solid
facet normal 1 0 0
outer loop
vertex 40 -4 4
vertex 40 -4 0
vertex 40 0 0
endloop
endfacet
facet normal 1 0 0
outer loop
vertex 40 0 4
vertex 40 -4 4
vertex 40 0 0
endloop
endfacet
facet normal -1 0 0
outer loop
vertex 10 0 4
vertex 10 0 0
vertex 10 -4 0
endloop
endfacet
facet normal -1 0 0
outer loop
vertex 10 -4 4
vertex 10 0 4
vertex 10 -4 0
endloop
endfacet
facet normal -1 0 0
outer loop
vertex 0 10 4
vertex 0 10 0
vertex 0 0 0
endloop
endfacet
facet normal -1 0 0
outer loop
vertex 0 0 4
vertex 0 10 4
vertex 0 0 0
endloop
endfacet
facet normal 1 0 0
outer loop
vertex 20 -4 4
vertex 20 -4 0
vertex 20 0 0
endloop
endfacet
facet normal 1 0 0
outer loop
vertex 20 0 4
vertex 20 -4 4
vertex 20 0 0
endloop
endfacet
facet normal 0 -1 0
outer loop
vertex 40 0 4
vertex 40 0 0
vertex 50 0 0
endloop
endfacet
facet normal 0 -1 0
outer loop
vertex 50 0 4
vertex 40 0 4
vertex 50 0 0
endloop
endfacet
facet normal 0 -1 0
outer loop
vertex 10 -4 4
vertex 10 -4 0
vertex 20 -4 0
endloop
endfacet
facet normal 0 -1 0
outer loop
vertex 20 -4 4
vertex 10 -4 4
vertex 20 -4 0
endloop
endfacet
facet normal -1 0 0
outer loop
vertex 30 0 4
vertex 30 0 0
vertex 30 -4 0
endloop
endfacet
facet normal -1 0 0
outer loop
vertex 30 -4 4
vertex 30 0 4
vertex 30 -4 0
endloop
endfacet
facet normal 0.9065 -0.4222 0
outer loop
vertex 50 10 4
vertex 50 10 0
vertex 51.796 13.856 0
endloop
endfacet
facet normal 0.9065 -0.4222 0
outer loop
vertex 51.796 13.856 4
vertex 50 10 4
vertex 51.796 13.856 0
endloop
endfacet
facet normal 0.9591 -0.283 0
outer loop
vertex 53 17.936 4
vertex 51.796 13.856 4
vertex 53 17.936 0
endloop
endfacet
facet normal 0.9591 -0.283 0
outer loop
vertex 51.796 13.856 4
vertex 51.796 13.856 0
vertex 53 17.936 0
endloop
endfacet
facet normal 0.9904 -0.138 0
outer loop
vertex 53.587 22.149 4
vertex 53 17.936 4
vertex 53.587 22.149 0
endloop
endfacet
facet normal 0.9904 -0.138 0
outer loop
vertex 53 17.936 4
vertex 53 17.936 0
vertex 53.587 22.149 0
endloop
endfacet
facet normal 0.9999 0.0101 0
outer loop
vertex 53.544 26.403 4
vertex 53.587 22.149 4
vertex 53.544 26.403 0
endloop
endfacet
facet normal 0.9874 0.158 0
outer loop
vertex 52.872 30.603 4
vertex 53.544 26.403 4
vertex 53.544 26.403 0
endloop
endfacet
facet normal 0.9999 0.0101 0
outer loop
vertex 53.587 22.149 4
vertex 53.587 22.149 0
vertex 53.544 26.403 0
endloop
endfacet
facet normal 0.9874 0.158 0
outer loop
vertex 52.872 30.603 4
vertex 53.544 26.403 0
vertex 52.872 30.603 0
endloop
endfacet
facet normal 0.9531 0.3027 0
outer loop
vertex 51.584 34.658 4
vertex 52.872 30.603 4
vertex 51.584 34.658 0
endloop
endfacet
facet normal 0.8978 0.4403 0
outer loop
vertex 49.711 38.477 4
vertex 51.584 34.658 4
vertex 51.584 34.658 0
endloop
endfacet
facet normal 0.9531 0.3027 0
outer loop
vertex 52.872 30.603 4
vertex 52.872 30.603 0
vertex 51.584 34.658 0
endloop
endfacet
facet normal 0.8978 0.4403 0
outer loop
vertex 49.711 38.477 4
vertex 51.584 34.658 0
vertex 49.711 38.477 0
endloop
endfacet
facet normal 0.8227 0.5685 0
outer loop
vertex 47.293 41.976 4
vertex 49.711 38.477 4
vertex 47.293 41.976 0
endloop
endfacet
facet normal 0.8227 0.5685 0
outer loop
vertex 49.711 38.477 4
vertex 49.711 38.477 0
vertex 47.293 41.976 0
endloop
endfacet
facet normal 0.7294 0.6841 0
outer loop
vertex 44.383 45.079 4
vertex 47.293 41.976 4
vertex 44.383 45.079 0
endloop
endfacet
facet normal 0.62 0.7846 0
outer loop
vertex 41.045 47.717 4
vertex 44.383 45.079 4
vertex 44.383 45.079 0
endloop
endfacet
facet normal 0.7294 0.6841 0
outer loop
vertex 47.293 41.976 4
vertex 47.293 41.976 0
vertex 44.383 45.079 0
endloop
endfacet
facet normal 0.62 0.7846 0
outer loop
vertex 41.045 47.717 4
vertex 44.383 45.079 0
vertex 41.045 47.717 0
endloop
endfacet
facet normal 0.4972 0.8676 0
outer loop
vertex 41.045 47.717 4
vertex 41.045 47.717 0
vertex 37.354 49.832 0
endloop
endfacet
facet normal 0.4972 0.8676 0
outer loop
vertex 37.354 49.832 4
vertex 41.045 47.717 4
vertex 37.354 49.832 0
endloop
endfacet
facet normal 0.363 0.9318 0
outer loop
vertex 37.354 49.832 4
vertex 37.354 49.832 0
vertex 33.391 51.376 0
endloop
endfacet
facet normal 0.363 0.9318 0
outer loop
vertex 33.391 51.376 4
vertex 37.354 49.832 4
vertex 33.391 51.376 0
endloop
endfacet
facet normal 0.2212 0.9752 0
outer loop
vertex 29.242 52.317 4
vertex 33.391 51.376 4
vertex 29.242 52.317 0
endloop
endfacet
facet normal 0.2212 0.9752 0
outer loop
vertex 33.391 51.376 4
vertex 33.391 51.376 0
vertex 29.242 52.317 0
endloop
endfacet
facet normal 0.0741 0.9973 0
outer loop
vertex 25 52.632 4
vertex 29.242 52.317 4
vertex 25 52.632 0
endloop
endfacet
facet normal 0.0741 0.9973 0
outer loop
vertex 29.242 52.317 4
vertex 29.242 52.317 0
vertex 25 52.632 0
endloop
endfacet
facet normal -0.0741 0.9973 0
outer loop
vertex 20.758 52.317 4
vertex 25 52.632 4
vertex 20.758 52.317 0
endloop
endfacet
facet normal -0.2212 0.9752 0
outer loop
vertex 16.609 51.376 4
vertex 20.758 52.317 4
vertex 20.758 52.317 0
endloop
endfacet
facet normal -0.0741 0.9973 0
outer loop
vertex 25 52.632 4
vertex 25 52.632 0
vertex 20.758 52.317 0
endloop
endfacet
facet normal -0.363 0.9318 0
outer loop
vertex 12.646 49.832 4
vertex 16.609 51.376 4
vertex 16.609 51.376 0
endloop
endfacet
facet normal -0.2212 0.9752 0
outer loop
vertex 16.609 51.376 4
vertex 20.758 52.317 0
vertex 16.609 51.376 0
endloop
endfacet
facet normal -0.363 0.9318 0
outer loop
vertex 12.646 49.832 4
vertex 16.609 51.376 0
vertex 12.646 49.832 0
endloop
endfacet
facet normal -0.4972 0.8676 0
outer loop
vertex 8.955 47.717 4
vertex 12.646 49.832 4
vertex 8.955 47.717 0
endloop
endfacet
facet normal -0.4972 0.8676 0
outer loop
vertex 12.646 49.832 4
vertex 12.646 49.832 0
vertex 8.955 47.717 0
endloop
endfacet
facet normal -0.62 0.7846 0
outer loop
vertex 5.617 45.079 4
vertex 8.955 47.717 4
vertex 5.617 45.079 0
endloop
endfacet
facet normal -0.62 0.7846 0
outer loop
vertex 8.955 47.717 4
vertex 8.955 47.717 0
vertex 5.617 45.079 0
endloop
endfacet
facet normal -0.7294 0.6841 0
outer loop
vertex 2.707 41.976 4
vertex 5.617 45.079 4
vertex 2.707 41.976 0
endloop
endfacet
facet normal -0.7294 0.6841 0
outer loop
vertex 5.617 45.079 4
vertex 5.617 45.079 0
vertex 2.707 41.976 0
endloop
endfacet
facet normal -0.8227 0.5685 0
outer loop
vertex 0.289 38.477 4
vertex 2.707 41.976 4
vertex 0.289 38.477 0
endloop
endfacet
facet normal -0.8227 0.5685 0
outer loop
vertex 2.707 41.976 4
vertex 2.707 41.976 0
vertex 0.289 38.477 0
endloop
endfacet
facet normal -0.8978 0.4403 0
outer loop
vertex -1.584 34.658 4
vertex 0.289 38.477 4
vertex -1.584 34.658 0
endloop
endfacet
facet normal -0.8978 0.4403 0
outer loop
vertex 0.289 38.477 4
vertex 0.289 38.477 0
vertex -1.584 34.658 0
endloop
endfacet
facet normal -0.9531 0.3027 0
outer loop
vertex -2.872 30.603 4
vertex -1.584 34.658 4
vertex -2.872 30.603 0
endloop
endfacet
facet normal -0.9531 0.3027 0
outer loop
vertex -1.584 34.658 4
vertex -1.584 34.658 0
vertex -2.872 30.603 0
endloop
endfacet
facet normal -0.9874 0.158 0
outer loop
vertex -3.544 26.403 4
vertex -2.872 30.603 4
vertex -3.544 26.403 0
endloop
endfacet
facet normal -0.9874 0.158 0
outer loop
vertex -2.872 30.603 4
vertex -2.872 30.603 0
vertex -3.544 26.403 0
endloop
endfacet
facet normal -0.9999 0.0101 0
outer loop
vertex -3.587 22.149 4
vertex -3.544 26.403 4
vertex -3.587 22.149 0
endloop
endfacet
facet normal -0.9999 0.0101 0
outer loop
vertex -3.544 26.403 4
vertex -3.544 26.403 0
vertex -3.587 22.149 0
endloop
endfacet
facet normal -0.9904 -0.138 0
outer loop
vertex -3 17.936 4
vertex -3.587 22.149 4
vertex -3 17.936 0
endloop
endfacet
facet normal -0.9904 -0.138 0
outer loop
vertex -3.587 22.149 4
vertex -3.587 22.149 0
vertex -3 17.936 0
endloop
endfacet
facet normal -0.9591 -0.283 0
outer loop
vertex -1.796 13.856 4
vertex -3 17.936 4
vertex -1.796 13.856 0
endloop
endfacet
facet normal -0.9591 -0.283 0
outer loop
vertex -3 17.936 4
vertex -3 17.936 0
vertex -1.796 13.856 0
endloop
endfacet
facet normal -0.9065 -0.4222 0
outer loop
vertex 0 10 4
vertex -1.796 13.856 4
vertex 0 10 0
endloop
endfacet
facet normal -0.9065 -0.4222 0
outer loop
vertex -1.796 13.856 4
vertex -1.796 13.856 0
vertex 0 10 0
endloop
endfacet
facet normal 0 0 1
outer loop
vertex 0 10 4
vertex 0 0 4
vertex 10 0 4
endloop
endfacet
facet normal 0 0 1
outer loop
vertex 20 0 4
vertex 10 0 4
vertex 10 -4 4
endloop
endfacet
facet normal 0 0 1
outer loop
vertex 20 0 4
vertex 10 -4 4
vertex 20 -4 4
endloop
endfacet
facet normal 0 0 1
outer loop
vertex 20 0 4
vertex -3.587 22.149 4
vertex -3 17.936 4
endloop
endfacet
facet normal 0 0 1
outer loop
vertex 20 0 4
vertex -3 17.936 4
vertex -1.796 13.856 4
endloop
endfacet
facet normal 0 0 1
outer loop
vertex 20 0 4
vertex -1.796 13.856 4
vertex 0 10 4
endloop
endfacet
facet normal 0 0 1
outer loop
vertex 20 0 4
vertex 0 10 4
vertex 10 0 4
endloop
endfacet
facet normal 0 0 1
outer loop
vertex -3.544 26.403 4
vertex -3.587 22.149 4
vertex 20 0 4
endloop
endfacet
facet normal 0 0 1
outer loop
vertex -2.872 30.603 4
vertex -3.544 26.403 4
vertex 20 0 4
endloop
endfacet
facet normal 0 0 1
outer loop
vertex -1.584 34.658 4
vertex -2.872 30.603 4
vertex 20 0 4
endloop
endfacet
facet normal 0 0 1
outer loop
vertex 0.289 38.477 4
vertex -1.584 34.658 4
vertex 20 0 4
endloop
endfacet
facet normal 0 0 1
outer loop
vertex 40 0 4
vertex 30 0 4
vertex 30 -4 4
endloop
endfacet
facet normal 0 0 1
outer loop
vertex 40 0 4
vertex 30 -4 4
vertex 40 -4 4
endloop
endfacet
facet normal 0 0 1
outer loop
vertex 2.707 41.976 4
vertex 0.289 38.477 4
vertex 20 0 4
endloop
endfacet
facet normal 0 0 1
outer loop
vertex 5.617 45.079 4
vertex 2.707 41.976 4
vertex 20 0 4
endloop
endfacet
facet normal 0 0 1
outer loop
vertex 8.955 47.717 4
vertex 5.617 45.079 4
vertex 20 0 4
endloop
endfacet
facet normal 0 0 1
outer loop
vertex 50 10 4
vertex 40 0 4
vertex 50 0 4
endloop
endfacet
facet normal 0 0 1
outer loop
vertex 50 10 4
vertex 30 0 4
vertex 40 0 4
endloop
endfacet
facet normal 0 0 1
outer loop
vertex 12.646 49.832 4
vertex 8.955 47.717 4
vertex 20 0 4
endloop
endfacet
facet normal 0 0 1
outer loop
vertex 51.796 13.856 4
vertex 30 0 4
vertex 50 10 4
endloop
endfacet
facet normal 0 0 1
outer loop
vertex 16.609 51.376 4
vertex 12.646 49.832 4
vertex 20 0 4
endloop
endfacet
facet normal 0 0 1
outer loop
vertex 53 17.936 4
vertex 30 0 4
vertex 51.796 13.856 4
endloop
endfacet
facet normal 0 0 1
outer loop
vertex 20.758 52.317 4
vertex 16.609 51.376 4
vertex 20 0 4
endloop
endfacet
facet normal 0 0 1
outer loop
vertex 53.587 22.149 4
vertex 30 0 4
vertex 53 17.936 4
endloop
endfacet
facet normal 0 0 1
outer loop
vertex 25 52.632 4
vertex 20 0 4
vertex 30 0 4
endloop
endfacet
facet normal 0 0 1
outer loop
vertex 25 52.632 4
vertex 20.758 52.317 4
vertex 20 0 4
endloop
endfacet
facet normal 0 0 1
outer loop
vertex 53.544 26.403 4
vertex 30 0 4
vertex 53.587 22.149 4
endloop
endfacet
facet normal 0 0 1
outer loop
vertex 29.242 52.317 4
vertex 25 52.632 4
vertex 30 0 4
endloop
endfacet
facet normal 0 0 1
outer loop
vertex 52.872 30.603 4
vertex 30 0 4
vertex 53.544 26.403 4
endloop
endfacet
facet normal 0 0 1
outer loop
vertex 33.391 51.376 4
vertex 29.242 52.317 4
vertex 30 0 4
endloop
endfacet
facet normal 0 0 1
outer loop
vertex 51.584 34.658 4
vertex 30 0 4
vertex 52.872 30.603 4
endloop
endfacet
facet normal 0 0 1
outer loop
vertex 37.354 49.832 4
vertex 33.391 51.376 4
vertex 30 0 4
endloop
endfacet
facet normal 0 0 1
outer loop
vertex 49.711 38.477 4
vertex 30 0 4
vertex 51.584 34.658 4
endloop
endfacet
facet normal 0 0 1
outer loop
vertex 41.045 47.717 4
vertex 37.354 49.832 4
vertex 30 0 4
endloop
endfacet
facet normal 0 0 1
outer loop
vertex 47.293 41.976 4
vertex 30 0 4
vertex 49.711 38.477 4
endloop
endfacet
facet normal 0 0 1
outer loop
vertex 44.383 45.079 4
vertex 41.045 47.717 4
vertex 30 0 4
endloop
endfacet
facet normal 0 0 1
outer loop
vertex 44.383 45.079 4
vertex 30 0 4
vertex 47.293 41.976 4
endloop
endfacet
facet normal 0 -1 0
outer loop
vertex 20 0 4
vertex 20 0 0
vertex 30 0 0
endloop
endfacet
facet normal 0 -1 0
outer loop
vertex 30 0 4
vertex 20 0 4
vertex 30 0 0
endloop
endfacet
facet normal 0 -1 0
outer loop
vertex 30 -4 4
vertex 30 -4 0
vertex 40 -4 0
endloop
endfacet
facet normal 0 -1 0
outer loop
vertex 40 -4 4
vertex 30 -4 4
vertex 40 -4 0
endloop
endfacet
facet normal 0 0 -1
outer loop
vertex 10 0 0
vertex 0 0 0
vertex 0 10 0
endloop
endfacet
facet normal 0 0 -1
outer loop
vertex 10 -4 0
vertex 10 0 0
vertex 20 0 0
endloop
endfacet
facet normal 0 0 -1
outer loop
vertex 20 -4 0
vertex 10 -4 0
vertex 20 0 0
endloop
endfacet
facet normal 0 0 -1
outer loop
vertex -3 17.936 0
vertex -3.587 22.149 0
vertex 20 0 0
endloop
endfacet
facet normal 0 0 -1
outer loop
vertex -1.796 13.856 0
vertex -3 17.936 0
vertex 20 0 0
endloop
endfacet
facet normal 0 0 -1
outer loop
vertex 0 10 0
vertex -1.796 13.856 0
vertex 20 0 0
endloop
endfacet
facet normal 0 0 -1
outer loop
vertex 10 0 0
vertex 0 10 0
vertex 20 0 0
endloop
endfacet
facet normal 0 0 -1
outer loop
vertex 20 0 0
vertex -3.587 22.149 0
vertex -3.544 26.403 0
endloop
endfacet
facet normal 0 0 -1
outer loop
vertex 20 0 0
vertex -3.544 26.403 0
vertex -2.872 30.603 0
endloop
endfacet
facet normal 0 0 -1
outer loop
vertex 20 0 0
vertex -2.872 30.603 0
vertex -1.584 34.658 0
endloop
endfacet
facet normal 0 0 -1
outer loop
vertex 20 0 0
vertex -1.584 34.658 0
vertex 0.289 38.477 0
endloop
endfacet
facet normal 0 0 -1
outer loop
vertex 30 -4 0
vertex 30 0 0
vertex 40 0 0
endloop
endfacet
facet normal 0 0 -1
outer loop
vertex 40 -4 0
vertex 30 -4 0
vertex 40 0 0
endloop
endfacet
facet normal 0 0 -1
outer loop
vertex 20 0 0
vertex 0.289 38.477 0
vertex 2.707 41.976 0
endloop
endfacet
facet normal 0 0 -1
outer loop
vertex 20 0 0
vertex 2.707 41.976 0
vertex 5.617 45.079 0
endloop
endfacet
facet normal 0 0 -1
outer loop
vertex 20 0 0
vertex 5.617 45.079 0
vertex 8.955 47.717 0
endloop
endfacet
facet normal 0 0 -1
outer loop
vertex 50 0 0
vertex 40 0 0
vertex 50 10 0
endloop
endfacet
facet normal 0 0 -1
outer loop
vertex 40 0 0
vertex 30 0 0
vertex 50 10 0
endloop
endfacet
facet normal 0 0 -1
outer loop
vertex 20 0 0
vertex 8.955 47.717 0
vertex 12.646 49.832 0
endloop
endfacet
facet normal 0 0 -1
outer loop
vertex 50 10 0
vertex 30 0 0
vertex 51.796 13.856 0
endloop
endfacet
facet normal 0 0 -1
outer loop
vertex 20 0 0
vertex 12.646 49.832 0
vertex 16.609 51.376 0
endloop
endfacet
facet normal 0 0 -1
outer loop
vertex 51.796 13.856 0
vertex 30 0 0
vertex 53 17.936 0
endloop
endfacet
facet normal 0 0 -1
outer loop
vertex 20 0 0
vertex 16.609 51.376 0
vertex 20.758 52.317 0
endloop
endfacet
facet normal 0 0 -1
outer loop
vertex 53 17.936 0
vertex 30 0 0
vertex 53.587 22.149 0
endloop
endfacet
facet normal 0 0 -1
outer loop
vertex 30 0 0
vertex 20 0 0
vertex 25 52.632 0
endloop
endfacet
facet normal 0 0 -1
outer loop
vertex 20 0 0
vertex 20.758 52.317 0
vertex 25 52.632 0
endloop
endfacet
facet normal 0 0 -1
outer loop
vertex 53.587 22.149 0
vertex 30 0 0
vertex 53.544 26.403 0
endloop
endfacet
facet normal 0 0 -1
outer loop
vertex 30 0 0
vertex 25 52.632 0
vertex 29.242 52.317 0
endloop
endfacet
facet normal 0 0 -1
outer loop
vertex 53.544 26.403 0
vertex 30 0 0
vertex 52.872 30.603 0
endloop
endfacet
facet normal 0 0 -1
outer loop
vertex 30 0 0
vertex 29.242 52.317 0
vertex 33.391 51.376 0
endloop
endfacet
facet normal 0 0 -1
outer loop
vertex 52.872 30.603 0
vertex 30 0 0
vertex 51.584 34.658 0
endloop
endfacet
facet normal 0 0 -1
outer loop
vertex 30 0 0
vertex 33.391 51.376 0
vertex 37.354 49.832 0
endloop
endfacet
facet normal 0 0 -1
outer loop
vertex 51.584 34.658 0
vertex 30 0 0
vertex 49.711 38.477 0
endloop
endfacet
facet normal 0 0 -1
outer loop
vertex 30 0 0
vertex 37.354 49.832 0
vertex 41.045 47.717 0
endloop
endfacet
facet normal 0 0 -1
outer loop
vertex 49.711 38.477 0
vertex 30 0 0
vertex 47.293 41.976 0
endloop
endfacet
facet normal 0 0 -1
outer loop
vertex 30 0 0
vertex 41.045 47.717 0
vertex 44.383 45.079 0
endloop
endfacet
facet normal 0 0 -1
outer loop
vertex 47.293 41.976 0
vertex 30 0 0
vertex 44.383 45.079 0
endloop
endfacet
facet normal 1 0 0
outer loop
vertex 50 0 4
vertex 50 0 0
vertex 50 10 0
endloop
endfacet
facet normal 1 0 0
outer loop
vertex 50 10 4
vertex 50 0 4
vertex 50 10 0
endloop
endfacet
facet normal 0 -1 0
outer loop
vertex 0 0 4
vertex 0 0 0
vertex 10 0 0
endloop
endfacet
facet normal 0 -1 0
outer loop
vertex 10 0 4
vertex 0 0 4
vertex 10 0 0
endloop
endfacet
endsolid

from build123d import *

# Parameters (mm, degrees)
BOSS_EXTRUDE1_DEPTH = 4


with BuildPart() as part:
    # Sketch1 → Boss-Extrude1 (new body)
    with BuildSketch(Plane.XY):
        with BuildLine():
            Line((0, 0), (10, 0))
            Line((10, 0), (10, -4))
            Line((10, -4), (20, -4))
            Line((20, -4), (20, 0))
            Line((20, 0), (30, 0))
            Line((30, 0), (30, -4))
            Line((30, -4), (40, -4))
            Line((40, -4), (40, 0))
            Line((40, 0), (50, 0))
            Line((50, 0), (50, 10))
            ThreePointArc((50, 10), (25, 52.632453378), (0, 10))
            Line((0, 10), (0, 0))
        make_face()
    extrude(amount=BOSS_EXTRUDE1_DEPTH)


solid = part.part
